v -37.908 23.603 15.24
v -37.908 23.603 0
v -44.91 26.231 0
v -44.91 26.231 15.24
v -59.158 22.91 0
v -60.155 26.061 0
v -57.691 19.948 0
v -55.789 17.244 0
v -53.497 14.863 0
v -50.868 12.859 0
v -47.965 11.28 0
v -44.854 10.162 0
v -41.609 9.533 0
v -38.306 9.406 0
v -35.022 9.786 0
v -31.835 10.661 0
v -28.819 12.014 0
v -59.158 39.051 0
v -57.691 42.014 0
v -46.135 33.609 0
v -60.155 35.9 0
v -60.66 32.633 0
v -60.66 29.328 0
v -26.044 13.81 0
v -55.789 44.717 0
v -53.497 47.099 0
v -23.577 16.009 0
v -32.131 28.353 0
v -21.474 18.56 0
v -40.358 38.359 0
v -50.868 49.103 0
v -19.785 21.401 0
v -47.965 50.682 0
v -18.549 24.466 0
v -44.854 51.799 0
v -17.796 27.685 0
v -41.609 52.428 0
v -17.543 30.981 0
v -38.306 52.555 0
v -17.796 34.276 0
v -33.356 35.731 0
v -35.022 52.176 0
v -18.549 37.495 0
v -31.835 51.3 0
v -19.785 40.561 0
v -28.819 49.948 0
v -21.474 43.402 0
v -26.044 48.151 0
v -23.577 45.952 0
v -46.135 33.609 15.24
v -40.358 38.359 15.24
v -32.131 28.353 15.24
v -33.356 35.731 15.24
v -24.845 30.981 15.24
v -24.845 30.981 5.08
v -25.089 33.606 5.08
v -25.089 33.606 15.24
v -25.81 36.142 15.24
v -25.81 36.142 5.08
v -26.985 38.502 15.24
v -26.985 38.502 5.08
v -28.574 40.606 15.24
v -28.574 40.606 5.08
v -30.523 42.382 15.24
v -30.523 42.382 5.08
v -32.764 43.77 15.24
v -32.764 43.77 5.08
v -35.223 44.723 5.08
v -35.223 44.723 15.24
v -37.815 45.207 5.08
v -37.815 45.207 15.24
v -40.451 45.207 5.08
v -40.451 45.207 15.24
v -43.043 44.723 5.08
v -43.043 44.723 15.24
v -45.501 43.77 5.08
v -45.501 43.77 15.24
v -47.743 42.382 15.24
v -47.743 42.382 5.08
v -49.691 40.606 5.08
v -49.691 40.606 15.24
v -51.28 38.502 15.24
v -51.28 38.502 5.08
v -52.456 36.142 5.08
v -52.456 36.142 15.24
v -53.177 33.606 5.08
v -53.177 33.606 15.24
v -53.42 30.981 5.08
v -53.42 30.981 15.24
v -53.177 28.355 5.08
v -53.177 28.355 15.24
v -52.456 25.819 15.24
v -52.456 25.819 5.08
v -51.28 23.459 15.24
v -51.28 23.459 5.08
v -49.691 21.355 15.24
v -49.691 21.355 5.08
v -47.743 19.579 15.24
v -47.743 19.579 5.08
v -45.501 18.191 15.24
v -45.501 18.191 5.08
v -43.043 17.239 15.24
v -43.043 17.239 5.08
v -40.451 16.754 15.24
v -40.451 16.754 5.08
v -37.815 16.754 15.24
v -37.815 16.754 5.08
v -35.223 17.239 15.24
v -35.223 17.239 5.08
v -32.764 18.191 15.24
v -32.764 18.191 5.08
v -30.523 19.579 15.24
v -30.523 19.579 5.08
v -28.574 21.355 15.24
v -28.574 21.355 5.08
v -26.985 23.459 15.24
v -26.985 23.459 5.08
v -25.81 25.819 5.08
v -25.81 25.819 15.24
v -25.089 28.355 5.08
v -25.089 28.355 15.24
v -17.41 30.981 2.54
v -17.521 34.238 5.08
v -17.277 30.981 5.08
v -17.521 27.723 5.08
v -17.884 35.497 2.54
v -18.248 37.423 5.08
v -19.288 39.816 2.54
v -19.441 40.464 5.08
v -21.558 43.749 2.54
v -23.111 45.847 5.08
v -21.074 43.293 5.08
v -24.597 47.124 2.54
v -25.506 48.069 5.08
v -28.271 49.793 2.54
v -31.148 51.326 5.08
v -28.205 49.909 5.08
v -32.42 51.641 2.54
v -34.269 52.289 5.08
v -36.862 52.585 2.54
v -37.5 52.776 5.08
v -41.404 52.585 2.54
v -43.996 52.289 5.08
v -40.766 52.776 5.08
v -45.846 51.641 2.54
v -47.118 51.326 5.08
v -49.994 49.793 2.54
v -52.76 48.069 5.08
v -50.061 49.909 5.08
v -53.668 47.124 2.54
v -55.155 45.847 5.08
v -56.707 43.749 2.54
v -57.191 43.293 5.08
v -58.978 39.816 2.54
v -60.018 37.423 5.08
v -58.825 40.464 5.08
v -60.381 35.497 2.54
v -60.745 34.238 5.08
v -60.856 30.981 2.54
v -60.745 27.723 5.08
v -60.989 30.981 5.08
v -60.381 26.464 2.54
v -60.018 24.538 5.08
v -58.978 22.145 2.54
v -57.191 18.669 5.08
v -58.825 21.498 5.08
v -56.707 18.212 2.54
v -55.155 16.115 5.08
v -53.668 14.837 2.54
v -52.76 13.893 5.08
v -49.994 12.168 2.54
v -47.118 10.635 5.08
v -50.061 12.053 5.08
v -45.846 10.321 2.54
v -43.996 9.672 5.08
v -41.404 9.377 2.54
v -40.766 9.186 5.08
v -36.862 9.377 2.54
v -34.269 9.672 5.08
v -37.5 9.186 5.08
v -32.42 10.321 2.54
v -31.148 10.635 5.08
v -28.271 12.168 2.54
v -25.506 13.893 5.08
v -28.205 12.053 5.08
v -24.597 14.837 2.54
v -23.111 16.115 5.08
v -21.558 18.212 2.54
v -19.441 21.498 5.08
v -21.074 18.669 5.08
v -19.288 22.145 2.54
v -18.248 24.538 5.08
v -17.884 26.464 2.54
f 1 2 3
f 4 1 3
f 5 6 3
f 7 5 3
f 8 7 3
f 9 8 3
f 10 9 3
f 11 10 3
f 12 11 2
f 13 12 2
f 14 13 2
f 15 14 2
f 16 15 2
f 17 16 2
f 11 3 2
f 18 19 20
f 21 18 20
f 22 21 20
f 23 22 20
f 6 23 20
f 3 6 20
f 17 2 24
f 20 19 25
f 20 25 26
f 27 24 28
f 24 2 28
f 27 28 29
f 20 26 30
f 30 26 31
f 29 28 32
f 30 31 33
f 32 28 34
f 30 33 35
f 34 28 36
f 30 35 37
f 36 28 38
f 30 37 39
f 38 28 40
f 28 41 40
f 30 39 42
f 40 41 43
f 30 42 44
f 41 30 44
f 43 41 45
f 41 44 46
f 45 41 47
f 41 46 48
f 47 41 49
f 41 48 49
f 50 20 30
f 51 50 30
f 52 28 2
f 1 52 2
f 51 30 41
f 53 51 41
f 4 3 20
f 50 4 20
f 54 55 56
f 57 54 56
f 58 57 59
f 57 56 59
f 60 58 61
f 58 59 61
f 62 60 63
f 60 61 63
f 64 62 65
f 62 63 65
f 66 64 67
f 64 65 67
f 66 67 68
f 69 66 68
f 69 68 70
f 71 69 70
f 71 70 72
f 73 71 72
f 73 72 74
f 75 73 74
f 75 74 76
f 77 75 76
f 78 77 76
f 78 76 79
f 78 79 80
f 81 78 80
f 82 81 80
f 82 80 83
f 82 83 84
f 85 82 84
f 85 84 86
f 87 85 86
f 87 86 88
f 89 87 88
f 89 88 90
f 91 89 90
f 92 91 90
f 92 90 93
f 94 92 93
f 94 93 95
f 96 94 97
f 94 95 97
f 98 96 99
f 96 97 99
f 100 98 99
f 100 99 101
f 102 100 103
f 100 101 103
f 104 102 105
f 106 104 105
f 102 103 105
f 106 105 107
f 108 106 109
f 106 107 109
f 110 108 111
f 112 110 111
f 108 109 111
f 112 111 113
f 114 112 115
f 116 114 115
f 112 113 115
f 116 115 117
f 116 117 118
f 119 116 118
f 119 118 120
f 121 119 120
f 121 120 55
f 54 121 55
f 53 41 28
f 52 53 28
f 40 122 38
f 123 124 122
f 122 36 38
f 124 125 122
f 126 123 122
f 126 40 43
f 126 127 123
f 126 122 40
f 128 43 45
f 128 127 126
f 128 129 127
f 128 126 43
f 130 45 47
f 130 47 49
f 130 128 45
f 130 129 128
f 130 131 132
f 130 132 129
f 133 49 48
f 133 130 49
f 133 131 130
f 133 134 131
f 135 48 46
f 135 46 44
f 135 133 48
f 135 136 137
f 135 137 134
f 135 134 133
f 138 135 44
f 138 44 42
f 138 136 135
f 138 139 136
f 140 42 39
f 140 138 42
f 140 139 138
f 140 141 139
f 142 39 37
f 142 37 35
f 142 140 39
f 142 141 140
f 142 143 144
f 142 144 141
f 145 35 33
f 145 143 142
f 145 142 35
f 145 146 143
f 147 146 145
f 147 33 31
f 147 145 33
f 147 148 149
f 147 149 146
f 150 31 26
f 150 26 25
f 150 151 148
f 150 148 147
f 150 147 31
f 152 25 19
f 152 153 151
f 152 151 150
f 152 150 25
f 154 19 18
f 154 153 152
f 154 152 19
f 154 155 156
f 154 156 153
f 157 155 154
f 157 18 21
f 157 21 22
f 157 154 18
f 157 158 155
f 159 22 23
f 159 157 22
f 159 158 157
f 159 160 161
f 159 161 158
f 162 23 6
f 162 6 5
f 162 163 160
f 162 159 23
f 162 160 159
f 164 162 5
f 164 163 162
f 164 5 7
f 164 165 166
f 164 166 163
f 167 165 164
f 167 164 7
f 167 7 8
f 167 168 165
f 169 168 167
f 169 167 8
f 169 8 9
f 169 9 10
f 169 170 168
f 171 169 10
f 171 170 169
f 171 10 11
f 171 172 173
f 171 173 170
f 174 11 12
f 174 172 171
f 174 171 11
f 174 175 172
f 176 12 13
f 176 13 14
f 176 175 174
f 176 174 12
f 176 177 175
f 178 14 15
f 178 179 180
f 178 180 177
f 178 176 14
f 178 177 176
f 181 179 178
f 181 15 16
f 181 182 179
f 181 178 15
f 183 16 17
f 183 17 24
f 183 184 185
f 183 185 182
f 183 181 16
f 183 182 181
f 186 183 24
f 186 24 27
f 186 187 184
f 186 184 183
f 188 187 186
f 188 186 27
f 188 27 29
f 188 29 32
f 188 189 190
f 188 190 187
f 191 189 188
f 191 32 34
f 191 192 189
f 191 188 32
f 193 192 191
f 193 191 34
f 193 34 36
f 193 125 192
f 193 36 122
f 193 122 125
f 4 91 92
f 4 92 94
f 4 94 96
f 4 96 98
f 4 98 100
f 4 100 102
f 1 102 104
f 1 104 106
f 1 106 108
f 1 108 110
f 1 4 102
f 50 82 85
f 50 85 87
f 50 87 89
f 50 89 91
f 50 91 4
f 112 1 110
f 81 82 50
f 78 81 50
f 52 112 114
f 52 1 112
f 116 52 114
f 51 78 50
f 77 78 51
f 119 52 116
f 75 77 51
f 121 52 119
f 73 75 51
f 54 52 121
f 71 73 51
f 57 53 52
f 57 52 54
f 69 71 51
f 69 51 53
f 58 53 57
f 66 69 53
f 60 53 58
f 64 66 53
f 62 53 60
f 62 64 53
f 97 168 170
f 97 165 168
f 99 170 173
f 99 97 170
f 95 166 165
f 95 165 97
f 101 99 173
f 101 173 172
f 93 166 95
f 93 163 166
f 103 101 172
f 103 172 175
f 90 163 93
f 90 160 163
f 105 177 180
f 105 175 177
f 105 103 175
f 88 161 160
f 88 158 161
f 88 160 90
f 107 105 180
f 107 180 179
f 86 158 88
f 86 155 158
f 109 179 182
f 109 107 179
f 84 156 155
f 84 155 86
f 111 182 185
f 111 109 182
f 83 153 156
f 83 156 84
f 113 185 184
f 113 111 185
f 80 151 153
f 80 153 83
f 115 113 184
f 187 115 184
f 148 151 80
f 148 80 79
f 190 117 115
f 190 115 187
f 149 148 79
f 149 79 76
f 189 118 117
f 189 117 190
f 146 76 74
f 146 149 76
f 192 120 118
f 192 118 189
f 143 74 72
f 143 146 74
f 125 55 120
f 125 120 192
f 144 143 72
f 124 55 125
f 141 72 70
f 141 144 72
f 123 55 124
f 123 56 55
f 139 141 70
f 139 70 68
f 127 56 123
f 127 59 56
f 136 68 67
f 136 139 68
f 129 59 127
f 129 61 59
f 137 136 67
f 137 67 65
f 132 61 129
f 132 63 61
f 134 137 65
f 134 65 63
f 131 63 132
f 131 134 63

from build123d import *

# Parameters (mm, degrees)
F0_R     = 21.59
F0_R_2   = 14.2875
F1_DEPTH = 5.08
F1_TAPER = -3
F2_DEPTH = 15.24


with BuildPart() as f1:
    # F0 (on Top) → F1 (new body)
    with BuildSketch(Plane.XY):
        with Locations((-39.1328502254, 30.9806439229)):
            Circle(F0_R)
        with Locations((-39.1328502254, 30.9806439229)):
            Circle(F0_R_2, mode=Mode.SUBTRACT)
    extrude(amount=F1_DEPTH, taper=F1_TAPER)

    # F0 (on Top) → F2 (join)
    with BuildSketch(Plane.XY):
        with Locations((-39.1328502254, 30.9806439229)):
            Circle(F0_R_2)
        Polygon((-40.3579410266, 38.3586195618), (-33.3558812942, 35.7305914981), (-32.130790493, 28.3526158592), (-37.9077594242, 23.602668284), (-44.9098191566, 26.2306963477), (-46.1349099578, 33.6086719866), align=None, mode=Mode.SUBTRACT)
    extrude(amount=F2_DEPTH)


solid = f1.part
